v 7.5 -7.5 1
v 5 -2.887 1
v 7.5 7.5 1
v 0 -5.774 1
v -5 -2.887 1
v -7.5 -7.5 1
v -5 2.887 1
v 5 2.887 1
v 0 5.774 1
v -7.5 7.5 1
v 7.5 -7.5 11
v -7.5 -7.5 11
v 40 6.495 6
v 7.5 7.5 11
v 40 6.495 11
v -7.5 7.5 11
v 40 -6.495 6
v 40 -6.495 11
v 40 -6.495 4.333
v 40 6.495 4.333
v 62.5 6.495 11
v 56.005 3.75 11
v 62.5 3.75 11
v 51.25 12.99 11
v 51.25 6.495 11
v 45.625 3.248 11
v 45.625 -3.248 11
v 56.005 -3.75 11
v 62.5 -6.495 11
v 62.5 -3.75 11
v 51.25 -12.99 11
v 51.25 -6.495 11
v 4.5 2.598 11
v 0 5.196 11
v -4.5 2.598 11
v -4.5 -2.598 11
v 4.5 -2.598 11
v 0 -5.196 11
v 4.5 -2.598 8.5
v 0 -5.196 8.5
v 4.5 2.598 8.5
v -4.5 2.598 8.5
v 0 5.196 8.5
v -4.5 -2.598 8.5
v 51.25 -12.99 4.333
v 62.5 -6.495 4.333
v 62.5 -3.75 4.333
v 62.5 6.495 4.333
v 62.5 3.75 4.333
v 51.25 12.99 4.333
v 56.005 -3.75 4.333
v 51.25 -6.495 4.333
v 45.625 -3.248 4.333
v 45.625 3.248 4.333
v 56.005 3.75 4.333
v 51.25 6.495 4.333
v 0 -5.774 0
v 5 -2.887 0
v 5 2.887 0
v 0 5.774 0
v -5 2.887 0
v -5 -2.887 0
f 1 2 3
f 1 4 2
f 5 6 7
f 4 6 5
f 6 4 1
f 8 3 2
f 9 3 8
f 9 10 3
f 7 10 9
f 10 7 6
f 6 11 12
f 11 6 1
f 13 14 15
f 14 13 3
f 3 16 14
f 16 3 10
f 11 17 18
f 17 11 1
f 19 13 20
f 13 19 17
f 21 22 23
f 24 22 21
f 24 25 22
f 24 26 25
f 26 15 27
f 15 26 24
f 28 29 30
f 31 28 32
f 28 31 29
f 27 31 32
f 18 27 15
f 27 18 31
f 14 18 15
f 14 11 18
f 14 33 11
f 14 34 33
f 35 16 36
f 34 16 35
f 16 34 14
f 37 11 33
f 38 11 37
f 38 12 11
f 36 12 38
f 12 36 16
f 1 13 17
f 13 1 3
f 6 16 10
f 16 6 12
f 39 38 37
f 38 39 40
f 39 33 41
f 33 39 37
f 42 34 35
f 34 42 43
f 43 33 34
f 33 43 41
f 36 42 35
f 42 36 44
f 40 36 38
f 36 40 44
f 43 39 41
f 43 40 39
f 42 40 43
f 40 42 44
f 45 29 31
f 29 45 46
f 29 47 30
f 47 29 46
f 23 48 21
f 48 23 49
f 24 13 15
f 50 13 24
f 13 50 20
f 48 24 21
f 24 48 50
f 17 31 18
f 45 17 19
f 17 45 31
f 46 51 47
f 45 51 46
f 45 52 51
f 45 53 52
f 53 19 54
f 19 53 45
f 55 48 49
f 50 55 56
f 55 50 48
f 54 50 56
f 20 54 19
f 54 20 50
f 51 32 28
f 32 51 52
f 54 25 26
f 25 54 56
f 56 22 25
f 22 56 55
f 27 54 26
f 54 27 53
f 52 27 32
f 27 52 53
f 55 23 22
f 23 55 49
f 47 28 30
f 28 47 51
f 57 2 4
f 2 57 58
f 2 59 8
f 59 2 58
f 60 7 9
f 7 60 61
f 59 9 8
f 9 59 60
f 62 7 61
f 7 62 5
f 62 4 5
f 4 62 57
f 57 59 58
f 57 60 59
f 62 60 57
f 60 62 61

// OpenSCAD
// file: plus/parts.scad
//////////////////////////////////////////////////////////////////////////////////////////////////
// parts [OBLOBOTS] 
// v.04 
// partes que estarán integradas en los volúmenes
//////////////////////////////////////////////////////////////////////////////////////////////////
// (c) Jorge Medal (@oblomobka) - Sara Alvarellos (@trecedejunio) Sep 2013
//////////////////////////////////////////////////////////////////////////////////////////////////
// GPL license ???
//////////////////////////////////////////////////////////////////////////////////////////////////

use <union.scad>

//-- sizes Buttons

PON = [11.7,2.35,0,0,11.7,1.6 ];	// [ diametro H, espesor H, d centro H, saliente H, diámetro M, espesor M]
PRY = [11,2.2,0,0,11,2.0 ];		// [ diametro H, espesor H, d centro H, saliente H, diámetro M, espesor M]
COS11 = [10,1.3,3.5,3,9.6,0.7];	// [ diámetro H, espesor H, d centro H, saliente H, diámetro M, espesor M]

////////////////////////////////////////////////////////
////////////////////// VOLÚMENES /////////////////////////

// --- Cono truncado ciego falda 45º
module blindcone (d=50	// diámetro del cono
				){

$fn=50;
union(){
	difference(){
		cylinder (r1=d/2,r2=d/4,h=d/4);
		translate([0,0,(d/4-7*d/32)+0.1])
			cylinder (r1=0,r2=7*d/32,h=7*d/32);
		}
	cylinder (r1=7*d/32,r2=d/32,h=7*d/32);
	}
}


// --- Piramide circunscrita en un círculo definido en las variables
module pyramid_C (	n=4,			// nº lados de la base de la pirámide	
					d1=20,		// diámetro del círculo-base donde se inscribe la pirámide
					d2=0,		// diámetro del círculo-punta donde se inscribe la pirámide
					h=10			// altura de la pirámide
					){

if(n%2==0){
rotate([0,0,180/n])
	cylinder (r1=d1/2/cos(180/n), r2=d2/2/cos(180/n), h=h, $fn=n);
}
else{
	rotate([0,0,90/n])
		cylinder (r1=d1/2/cos(180/n), r2=d2/2/cos(180/n), h=h, $fn=n);
}

}

// ------- pyramid_C (n=n,d1=d1,d2=d2,h=h); -----------------

// --- Prisma circunscrit0 en un círculo definido en las variables
module prism_C (	n=4,			// nº lados de la base del prisma
				d=20,		// diámetro del círculo donde se inscribe el prisma
				h=10			// altura del prisma
				){
if(n%2==0){
rotate([0,0,180/n])
	cylinder (r=d/2/cos(180/n), h=h, $fn=n);
}
else{
	rotate([0,0,90/n])
	cylinder (r=d/2/cos(180/n), h=h, $fn=n);
}

}

// ------- prism_C (n=n,d=d,h=h); -----------------


////////////////////////////////////////////////////////
////////////////////// DECORACIÓN /////////////////////////

module badge_f (	n=5,			// nº lados de la base de la pirámide	
				d=20,		// diámetro del círculo-base donde se inscribe la pirámide
				h=3,			// altura de la pirámide
				button=0,	// si =1 se construira un rebaje para un botón automático
				typ			// tipo de botón automático
				){
d2=d-2*h;

if(n%2==0){
	rotate([0,0,180/n])
		cylinder (r1=d/2/cos(180/n), r2=d2/2/cos(180/n), h=h, $fn=n);
	}
	else{
		rotate([0,0,90/n])
			cylinder (r1=d/2/cos(180/n), r2=d2/2/cos(180/n), h=h, $fn=n);
		}

	if(button==1){
		translate([0,0,h])
			auto_button_m0(typ);
		}
}
// ------- shield_f (n=n,d=d,h=h,button=button,typ=[typ]); -----------------


module badge_m (	n=5,			// nº lados de la base de la pirámide	
				d=19,		// diámetro del círculo-base donde se inscribe la pirámide
				h=3,			// altura de la pirámide
				B=1,			// Tipo de escudo
				button=0,	// si =1 se construira un rebaje para un botón automático
				typ			// tipo de botón automático
				){
$fn=50;

d2=d-2*h;

difference(){
	union(){
		pyramid_C (n=n,d1=d,d2=d2,h=h);
		if(B==1||B==2){
			mirror([0,0,1])
				hull(){
					prism_C (n=n,d=d,h=0.5);
	
					translate([0,0,d/4])
						if(B==1){
							cylinder(r=d/4,h=1);
							}
							else{
								if(B==2){
									sphere(d/4);
								}
							}
					}
				}
		else{
		if(B==3){
			mirror([0,0,1])
				difference(){
					prism_C(d=d,h=6,n=n);
					translate ([0,0,1])
						prism_C(d=d-5,h=6,n=n);
					}
			}	
		}
	}
	if(button==1){
		translate([0,0,h])
			rotate([0,180,0])
				auto_button_f0(typ);
		}
	else{}
	if(B==1){
		translate([0,0,-(d/4+3)])
			prism_C(d=d/3,h=6,n=n);
		}
	}
}

// ------- badge_m (B=B,n=n,d=d,h=h,button=button,typ=[typ]); -----------------

/////////////////////////////////////////////////////////
////////// MÓDULOS PARA ALOJAR LEDS  ////////////////////

// Cono truncado hueco. Funciona como alojamiento para un led
module ledsocket (	ledn=5,		// Valor nominal del led
					h=4			// altura del cono						
					){
$fn=50;
hi=1.2;
edge=1;					// borde del ojo
ledr=ledn+1;
socket=ledr+1;
lash=socket+2*edge;
fring=1;					// factor que define la falda del cono 1=45º
ring=lash+2*h*fring;

	difference(){

		cylinder(r2=lash/2,r1=ring/2,h=h);

		union(){
			cylinder(r2=ledr/2,r1=socket/2,h=hi+0.1);

			translate([0,0,hi])
				cylinder(r2=socket/2,r1=ledr/2,h=h-hi);

			translate([0,0,h-0.1])
				cylinder(r=socket/2, h=2);

			translate([0,0,-2])
				cylinder(r=socket/2, h=2.1);
		}
	}
}


// Cono truncado hueco. Funciona como alojamiento para un led
module ledsocket_exp(	ledn=5,		// Valor nominal del led
					h=4,			// altura del cono
					exp1=-25,	// [-45:45]	factor para la expresión
					exp2=50		// [1:100]	factor para la expresión
					){
$fn=50;
hi=1.2;
ledr=ledn+1;
socket=ledr+1;
edge=1;							// borde del ojo
lash=socket+2*edge;
fring=1;							// factor que define la falda del cono 1=45º
ring=lash+2*h*fring;

eyer2=socket+2*edge;				// Variable auxiliar
eyer1=eyer2+2*h*fring;			// Variable auxiliar

cut=((eyer1-eyer2)/2)*exp2/100;		// Variable auxiliar

difference(){	
	difference(){
		cylinder(r2=lash/2,r1=ring/2,h=h);
		union(){
			cylinder(r2=ledr/2,r1=socket/2,h=hi+0.1);
			translate([0,0,hi])
				cylinder(r2=socket/2,r1=ledr/2,h=h-hi);
			translate([0,0,h-0.1])
				cylinder(r=socket/2, h=2);
			translate([0,0,-0.1])
				cylinder(r=socket/2, h=0.2);
			}
		}
	translate ([0,0,h/2])
		rotate ([0,0,exp1])
			translate ([0,eyer1/2+eyer2/2+0.5+cut,0])	
				cube ([eyer1,eyer1,eyer1],center=true);						
	}
}

// -------------- Fin de los módulos para alojar leds ---------------------
// ------------------------------------------------------------------------


/////////////////////////////////////////////////////////////////////////
/////////////////// Ejemplos de aplicación //////////////////////////////

*badge_f(button=1,typ=COS11);

translate ([0,-30,0])
badge_m(B=1, button=1,typ=COS11);

translate ([0,-60,0])
badge_m(B=2,button=1,typ=COS11);

translate ([0,-90,0])
badge_m(B=3,button=1,typ=COS11);


blindcone (d=25);	
translate ([0,30,0])
	blindcone (d=12);	
translate ([0,60,0])
	blindcone (d=30);	

translate ([40,0,0])
	pyramid_C (n=6,d1=20,d2=10,h=10);
translate ([40,30,0])
	pyramid_C (n=4,d1=30,d2=0,h=20);
translate ([40,60,0])
	pyramid_C (n=5,d1=23,d2=5,h=34);
					
translate ([-40,0,0])
	ledsocket_exp (ledn=5,h=6,exp1=-45,exp2=20);


translate ([-40,30,0])
	ledsocket_exp (ledn=5,h=4,exp1=25,exp2=40);
translate ([-40,60,0])
	ledsocket_exp (ledn=5,h=2,exp1=0,exp2=100);
// file: plus/union.scad
//////////////////////////////////////////////////////////////////////////////////////////////////
// union [OBLOBOTS] 
// v.04 
// elementos de unión entre las partes del cuerpo de los oblobots
//////////////////////////////////////////////////////////////////////////////////////////////////
// (c) Jorge Medal (@oblomobka) - Sara Alvarellos (@trecedejunio) Sep 2013
//////////////////////////////////////////////////////////////////////////////////////////////////
// GPL license
//////////////////////////////////////////////////////////////////////////////////////////////////

use <parts.scad>

//////////////////////////////////////////////////////
////////// MÓDULOS TIPO MACHO-HEMBRA /////////////////

/////////// MACHOS ///////////

// ---- Pin cilíndrico simple. Tiene un ligero achafalnado en la punta
module pin0(	d=15,	// diámetro del pin
			h=10	,	// longitud del pin
			db1=0,	// diámetro de la base1
			db2=0,	// diámetro de la base2 si es =db1 es un cilindro
			hb=0	,	// longitud de la base
			n=32		// número de lados del prisma base
			){
$fn=50;
h1=1;
h2=h-h1;

translate([0,0,hb])
union(){
	cylinder(r=d/2, h=h2);
	translate([0,0,h2])
		cylinder (r1=d/2,r2=(d-2)/2,h=h1);
	translate([0,0,-hb])
	pyramid_C(d1=db1,d2=db2,h=hb,n=n);
	}
	
}

// --- pin que se ensancha en la punta
module pin2 (	d=8,	// diámetro del taladro
				h=20	,	// longitud del pin
				db1=0,	// diámetro de la base1
				db2=0,	// diámetro de la base2 si es =db1 es un cilindro
				hb=0	,	// longitud de la base
				n=0,		// número de lados del prisma base
				k=0.3,	// marca el espesor de la pestaña
				s=0.3	// holgura
				){
$fn=50;

dp=d+0.8;
hp=h/10;
space=s;
k1=d*k;

translate([0,0,hb])
difference(){
union(){
cylinder(r=(d-space)/2,h=h/2);
translate([0,0,h/2])
cylinder(r1=(d-space)/2,r2=(dp-space)/2,h=h/2-h/10);
translate([0,0,h-h/10])
	cylinder (r1=(dp-space)/2,r2=(d-1)/2,h=h/10-0.5);
translate([0,0,-hb])
	pyramid_C(d1=db1,d2=db2,h=hb,n=n);
}

translate([0,0,h])
for(i=[90,180]){
	rotate([0,0,i])
		union(){
			cube([2*d,d/8,h],center=true);
			translate([0,0,-h/2])rotate([90,0,0])
				cylinder(r=d/16,h=2*d,center=true);
			}
	}

cylinder(r=k1/2,h=3*h, center=true);
}

}


////////// HEMBRAS ////////////////////

// --- Taladro poligonal para volumen macizo
module drill0 (	d=12,	// diámetro del taladro
				h=6		// profundidad del taladro
				){
$fn=50;
s=6;			// Nº de lados del taladro (el taladro es poligonal, normalmente será hexagonal)

translate([0,0,-0.2])
	intersection(){
		cylinder (r=(d/cos(180/s))/2,h=h,$fn=s);
		cylinder (r=(d+d/20)/2,h=h);
	}
}

// --- Taladro poligonal para volumen hueco - Añade una caña donde alojar el pin
module drill1 (	d=12,	// diámetro del taladro
				h=15		// profundidad del taladro
				){
$fn=50;
s=6;			// Nº de lados del taladro (el taladro es poligonal, normalmente será hexagonal)
e=3;			// espesor de la caña donde se alojará el pin correspondiente

difference(){
	child (0);
	cylinder (r=(d+2*e)/2,h=2*h,center=true);	
	}

difference(){
	cylinder (r=(d+e)/2,h=h);
	translate([0,0,-1])
		intersection(){
			cylinder (r=(d/cos(180/s))/2,h=h,$fn=s);
			cylinder (r=(d+d/20)/2,h=h);
		}
	}
}


// --- Taladro que se ensancha en la punta
module drill2 (	d=12,	// diámetro del taladro
				h=25		// profundidad del taladro
				){
$fn=50;

dp=d+0.8;
hp=h/10;

union(){
	translate([0,0,-0.5])
		cylinder(r=d/2,h=0.5+h/2);
	translate([0,0,(h-0.05)/2])
		cylinder(r1=d/2,r2=dp/2,h=h/2-h/10);
	translate([0,0,h-h/10-0.025])
		cylinder (r1=dp/2,r2=(d-1)/2,h=h/10);
	}
}

// --- Taladro que se ensancha en la punta con caña
module drill3 (	d=12,	// diámetro del taladro
				h=25		// profundidad del taladro
				){
$fn=50;

dp=d+0.8;
hp=h/10;
e=1.5;				// espesor de la caña donde se alojará el pin correspondiente

difference(){
	child (0);
	color("red")
	cylinder (r=(d+2*e)/2,h=2*h,center=true);	
	}

color("green")
difference(){
	cylinder (r=(d+2*e)/2,h=h);
	union(){
	translate([0,0,-0.5])
		cylinder(r=d/2,h=0.5+h/2);
	translate([0,0,(h-0.05)/2])
		cylinder(r1=d/2,r2=dp/2,h=h/2-h/10);
	translate([0,0,h-h/10-0.025])
		cylinder (r1=dp/2,r2=(d-1)/2,h=h/10);
	}
}
}

// -------------- Fin de los módulos tipo macho-hembra --------------------
// ------------------------------------------------------------------------

//////////////////////////////////////////////////////
////////// MÓDULOS TIPO BOTÓN AUTOMÁTICO /////////////

////////// HEMBRAS ////////////////////

// Dibuja un cilindro que se debe restar del bloque principal donde se colocará el botón

module auto_button_f0 (	typ,		// Tipo de botón
						c=0.1		// corrección, para ajustar el diámetro
						){

e=2;			// pared

h=typ[1]+0.1;
d=typ[0]+c;

hs=max(0,typ[3]-h);
ds=typ[2];

$fn=50;

translate([0,0,-0.1])
union(){
cylinder (r=d/2,h=h);
translate([0,0,h+0.3])
cylinder (r=ds/2,h=hs);
}	
}

// Asociado al modelo principal (como si fuera una modificación) resta y añade el alojamiento del botón
module auto_button_f1 (	typ,		// Tipo de botón
						c=0		// corrección, para ajustar el diámetro

						){

e=2;			// pared
	
h=typ[1];
d=typ[0]+c;

$fn=50;

difference(){
	child (0);
	cylinder (r=(d+2*e)/2,h=2*(h+e),center=true);	
	}

difference(){
	cylinder (r=(d+2*e)/2,h=h+e);
	translate([0,0,-0.1])
		cylinder (r=d/2,h=h);
			
		}
}


/////////// MACHOS ///////////

// Dibuja un cilindro que se debe restar del bloque principal donde se colocará el botón
module auto_button_m0 (	typ,		// Tipo de botón
						c=0		// corrección, para ajustar el diámetro
						){

h=typ[5]+0.3;
d=typ[4]+c;

$fn=50;

translate([0,0,-0.1])
cylinder (r=d/2,h=h);			
}

// Asociado al modelo principal (como si fuera una modificación) resta y añade el alojamiento del botón
module auto_button_m1 (	typ,		// Tipo de botón
						c=0		// corrección, para ajustar el diámetro
						){

e=2;			// pared	

h=typ[5];
d=typ[4]+c;

$fn=50;

difference(){
	child (0);
	cylinder (r=(d+2*e)/2,h=2*(h+e),center=true);	
	}

difference(){
	cylinder (r=(d+2*e)/2,h=h+e);
	translate([0,0,-0.1])
		cylinder (r=d/2,h=h);
			
		}
}

// Asociado al modelo principal (como si fuera una modificación) resta y añade el alojamiento del botón
// añade un pedestal en el volumen principal

module auto_button_m2 (	typ,		// Tipo de botón
						c=0,		// corrección, para ajustar el diámetro
						hb=0,	// longitud de la base
						db=15,	// diámetro de la base
						n=8,		// número de lados del prisma base
						z=0		// posiciona la pieza en altura
						){

//e=2;			// pared	

h=typ[5]+0.3;;
d=typ[4]+c;


ht=h+hb;

$fn=50;

difference(){
	child (0);
	translate([0,0,z+0.05])
	translate([0,0,-h+hb])
		cylinder (r=d/2,h=h);	
	}


translate([0,0,z-h])
difference(){
	prism_C(d=db,h=ht,n=n);
	translate([0,0,+0.05+hb])
		cylinder (r=d/2,h=h);	
	}
}

/////////////////////////////////////////////////////////////////////////
/////////////////// Ejemplos de aplicación //////////////////////////////


//-- sizes Buttons

PON = [11.7,2.35,0,0,11.7,1.6 ];	// [ diametro H, espesor H, d centro H, saliente H, diámetro M, espesor M]
PRY = [11,2.2,0,0,11,2.0 ];		// [ diametro H, espesor H, d centro H, saliente H, diámetro M, espesor M]
COS11 = [10,1.3,3.5,3,9.6,0.7];	// [ diámetro H, espesor H, d centro H, saliente H, diámetro M, espesor M]
							
// main file
///////////////////////////////////////////////////////////////////////////////////////////////
// arm [OBLOBOTS] 
// 
// v.04
//////////////////////////////////////////////////////////////////////////////////////////////////
// (c) Jorge Medal (@oblomobka) - Sara Alvarellos (@trecedejunio) Sep 2013
//////////////////////////////////////////////////////////////////////////////////////////////////
// GPL license
//////////////////////////////////////////////////////////////////////////////////////////////////

use <plus/union.scad>
use <plus/parts.scad>

////////////////////////////////////////////////////////////////////////
/////////////////// MODULO armQ()  ////////////////////////////////

module armQ (	arm=[10,15,70],	// [ grosor(x), fondo(y), longitud(z) ] Medidas de los Brazo
				an=8				// [4,6,8,10,12] nº de lados del polígono de la mano
				){


ax=arm[0];	// medida del brazo: grosor
ay=arm[1];	// medida del brazo: fondo
az=arm[2];	// medida del brazo: longitud

hand=3*ay/2;
wrist=2*(hand/2)*tan(180/max(6,min(2*floor(an/2),12)));
az1=az-(ay/2)-hand-(wrist/2);

translate([0,0,1])
union(){
difference(){
hull(){
	translate([0,0,ax/2])
		cube([ay,ay,ax],center=true);

	translate([az1,0,3*ax/4])
		cube([wrist,wrist,ax/2],center=true);
	}
translate([0,0,3*ax/4])
	prism_C (n=min(2*floor(an/2),12),d=9,h=ax);
}
translate([0,0,-1])

prism_C (n=min(2*floor(an/2),12),d=10,h=ax/2);
	



difference(){
	translate([(az-hand/2-ay/2),0,ax/3])
		pyramid_C (n=min(2*floor(an/2),12),d1=hand,d2=hand,h=ax/1.5);

	translate([(az-hand/2-ay/2),0,ax/4])
		pyramid_C (n=min(2*floor(an/2),12),d1=hand/2,d2=hand/2,h=ax);

	translate([(az-hand/2-ay/2),-hand/6,0])
		cube([az,hand/3,2*ax]);
	}
}

}

// -------------- Fin del módulo armQ() ----------------------------------
// ------------------------------------------------------------------------------


armQ(arm=[10,15,70],an=6);
